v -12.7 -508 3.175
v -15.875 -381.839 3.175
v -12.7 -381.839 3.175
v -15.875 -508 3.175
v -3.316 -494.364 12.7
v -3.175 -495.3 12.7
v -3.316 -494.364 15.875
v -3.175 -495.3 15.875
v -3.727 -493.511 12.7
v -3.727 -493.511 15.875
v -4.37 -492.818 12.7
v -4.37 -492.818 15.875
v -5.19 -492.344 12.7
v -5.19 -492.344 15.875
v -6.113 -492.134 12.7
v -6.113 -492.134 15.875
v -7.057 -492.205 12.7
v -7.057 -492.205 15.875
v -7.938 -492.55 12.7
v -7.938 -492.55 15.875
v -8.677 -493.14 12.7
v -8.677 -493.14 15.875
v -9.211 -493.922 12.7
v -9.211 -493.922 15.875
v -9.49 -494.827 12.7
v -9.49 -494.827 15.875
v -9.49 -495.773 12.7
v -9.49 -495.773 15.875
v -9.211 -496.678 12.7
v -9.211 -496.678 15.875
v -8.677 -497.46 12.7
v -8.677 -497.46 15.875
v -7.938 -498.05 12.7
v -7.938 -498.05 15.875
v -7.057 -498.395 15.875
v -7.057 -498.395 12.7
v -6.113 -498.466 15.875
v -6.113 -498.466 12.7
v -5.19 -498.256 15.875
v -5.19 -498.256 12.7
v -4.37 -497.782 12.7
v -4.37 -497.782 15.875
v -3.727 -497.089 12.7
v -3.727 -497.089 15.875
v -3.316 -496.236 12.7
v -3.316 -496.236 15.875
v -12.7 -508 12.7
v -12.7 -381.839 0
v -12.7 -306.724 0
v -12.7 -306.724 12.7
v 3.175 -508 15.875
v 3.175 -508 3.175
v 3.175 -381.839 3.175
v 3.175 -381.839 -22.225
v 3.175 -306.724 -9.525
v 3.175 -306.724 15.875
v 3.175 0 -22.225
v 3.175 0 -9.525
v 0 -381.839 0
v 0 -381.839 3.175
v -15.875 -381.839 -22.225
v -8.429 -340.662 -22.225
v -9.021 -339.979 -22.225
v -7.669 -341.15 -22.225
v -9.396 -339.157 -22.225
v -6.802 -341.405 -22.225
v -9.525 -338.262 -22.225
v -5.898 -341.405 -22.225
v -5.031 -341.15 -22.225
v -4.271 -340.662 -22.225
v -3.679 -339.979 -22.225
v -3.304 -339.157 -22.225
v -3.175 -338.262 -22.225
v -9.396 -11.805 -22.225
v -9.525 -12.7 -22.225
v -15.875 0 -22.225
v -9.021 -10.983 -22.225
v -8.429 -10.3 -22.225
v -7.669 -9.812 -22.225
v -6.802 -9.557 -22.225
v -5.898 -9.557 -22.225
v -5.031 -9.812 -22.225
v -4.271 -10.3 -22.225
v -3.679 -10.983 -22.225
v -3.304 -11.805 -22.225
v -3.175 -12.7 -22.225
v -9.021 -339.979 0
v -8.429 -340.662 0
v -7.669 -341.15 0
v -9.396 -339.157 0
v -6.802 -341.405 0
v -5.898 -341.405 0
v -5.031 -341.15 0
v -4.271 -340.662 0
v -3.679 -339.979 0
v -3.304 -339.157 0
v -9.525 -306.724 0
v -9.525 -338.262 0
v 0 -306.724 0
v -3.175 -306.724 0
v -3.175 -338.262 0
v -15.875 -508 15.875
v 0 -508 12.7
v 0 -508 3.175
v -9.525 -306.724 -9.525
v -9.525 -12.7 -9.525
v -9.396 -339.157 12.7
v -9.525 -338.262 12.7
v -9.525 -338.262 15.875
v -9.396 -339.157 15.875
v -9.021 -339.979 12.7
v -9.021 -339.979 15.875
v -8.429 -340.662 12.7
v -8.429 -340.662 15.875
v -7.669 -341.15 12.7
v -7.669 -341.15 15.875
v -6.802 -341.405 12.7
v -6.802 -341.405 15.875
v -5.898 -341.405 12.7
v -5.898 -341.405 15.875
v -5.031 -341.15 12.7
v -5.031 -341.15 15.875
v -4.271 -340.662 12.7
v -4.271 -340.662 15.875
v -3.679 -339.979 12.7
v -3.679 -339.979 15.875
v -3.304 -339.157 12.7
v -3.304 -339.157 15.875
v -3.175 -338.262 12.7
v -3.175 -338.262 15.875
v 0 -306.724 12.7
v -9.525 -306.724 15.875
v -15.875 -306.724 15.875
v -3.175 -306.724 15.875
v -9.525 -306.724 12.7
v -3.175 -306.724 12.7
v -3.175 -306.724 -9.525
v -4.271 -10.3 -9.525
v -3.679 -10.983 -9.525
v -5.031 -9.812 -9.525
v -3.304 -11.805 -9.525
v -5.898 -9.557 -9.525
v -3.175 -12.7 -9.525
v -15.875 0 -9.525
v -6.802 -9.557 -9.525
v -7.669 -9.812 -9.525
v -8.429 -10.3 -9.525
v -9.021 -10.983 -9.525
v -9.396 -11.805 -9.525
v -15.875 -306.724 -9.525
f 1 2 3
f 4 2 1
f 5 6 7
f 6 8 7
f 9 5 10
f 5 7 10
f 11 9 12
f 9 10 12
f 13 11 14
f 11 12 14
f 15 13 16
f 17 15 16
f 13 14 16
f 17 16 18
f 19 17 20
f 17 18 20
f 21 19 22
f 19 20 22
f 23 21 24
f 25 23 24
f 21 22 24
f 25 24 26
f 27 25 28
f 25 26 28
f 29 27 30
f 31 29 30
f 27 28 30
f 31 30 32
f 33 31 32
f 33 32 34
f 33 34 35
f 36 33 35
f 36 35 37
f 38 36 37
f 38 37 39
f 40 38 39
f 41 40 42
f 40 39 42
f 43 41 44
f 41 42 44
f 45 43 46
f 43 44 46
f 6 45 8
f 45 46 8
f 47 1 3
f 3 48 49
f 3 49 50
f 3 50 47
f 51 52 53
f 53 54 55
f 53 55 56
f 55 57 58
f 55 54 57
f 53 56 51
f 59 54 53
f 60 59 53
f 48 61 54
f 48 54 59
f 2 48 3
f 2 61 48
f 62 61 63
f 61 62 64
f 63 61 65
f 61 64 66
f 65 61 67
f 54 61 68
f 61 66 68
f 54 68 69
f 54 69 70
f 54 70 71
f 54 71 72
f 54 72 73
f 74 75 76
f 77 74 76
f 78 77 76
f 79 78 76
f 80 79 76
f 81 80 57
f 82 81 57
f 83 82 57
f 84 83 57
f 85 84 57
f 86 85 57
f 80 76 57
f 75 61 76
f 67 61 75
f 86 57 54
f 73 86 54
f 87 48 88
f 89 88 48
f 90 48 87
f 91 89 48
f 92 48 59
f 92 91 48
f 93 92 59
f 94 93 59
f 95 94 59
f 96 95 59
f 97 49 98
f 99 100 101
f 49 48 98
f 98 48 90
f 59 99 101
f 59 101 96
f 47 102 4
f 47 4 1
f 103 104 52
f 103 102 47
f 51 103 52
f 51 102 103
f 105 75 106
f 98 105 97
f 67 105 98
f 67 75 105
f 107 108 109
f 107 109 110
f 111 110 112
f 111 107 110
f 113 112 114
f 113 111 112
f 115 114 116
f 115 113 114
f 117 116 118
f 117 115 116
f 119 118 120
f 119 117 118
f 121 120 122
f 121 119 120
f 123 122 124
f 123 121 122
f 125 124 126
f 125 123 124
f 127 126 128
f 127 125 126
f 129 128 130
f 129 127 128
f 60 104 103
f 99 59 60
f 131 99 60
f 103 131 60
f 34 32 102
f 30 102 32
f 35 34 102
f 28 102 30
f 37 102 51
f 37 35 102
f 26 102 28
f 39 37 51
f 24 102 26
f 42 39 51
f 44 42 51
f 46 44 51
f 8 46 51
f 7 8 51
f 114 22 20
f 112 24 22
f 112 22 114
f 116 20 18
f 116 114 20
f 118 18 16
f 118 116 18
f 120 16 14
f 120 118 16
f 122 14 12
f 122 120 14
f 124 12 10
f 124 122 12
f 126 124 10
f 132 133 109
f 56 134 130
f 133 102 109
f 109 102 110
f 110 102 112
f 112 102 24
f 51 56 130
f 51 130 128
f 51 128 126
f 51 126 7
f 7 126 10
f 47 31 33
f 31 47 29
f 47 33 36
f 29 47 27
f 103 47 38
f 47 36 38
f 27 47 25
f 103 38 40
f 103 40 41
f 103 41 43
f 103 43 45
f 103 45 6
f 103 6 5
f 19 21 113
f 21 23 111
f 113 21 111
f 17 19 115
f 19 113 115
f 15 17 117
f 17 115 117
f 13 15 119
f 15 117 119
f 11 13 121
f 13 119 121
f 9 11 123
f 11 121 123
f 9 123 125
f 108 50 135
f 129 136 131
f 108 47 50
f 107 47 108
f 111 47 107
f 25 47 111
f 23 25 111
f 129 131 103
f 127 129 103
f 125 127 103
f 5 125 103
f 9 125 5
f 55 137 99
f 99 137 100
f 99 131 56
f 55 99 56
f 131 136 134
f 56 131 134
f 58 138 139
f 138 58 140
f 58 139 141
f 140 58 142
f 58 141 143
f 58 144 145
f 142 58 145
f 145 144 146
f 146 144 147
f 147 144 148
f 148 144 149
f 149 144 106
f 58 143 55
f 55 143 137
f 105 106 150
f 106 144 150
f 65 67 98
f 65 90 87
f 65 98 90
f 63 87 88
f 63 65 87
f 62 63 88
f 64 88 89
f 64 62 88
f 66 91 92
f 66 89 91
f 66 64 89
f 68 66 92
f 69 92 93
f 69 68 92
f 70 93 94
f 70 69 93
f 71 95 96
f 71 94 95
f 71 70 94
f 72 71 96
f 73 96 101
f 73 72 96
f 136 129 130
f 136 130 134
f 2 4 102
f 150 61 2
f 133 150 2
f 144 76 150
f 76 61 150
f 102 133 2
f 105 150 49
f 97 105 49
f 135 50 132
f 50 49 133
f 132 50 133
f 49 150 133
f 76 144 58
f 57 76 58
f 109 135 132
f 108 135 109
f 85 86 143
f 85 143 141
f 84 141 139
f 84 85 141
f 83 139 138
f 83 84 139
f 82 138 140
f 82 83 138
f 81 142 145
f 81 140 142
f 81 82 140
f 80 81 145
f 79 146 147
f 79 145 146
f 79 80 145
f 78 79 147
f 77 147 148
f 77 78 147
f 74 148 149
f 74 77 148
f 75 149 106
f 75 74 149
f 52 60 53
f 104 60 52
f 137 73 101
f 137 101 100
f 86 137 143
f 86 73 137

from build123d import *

# Parameters (mm, degrees)
F0_W     = 19.05
F0_H     = 38.1
F0_W_2   = 12.7
F0_H_2   = 12.7
F1_DEPTH = 508
F2_R     = 3.175
F3_DEPTH = 63.5
F4_W     = 306.7244030911
F4_H     = 25.4
F4_W_2   = 126.1607544422
F5_DEPTH = 25.4


with BuildPart() as f1:
    # F0 (on Front) → F1 (new body)
    with BuildSketch(Plane.XZ):
        with Locations((-6.35, -3.175)):
            Rectangle(F0_W, F0_H)
        with Locations((-6.35, 6.35)):
            Rectangle(F0_W_2, F0_H_2, mode=Mode.SUBTRACT)
    extrude(amount=F1_DEPTH)

    # F2 (on Top) → F3 (cut, symmetric)
    with BuildSketch(Plane.XY):
        with BuildLine():
            Line((-3.175, -254), (-3.175, -12.7))
            ThreePointArc((-3.175, -12.7), (-6.35, -9.525), (-9.525, -12.7))
            Line((-9.525, -12.7), (-9.525, -254))
            Line((-9.525, -254), (-9.525, -338.2622301579))
            ThreePointArc((-9.525, -338.2622301579), (-6.35, -341.4372301579), (-3.175, -338.2622301579))
            Line((-3.175, -338.2622301579), (-3.175, -254))
        make_face()
        with Locations((-6.35, -495.3)):
            Circle(F2_R)
    extrude(amount=F3_DEPTH, both=True, mode=Mode.SUBTRACT)

    # F4 (on face) → F5 (cut)
    with BuildSketch(Plane(origin=(-15.875, 0, 0), x_dir=(0, -1, 0), z_dir=(-1, 0, 0))):
        with Locations((153.3622015456, 3.175)):
            Rectangle(F4_W, F4_H)
        with Locations((444.9196227789, -9.525)):
            Rectangle(F4_W_2, F4_H)
    extrude(amount=-F5_DEPTH, mode=Mode.SUBTRACT)


solid = f1.part
